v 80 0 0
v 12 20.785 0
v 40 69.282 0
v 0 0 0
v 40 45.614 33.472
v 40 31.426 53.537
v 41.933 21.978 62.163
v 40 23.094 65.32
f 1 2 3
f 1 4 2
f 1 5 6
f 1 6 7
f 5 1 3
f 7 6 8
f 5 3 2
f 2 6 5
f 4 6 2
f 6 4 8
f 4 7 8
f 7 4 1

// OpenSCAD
alpha = acos (1/3);

module tetraeder (len) {
    difference() {
        cube([len, len, len]);
        translate([len,0,0])
            rotate(30,[0,0,1])
                rotate(-(90-alpha),[0,1,0])
                    translate([0,0,-len*0.3])
                        cube([len*1.6, len*1.6, len*1.6]);
        rotate(-30,[0,0,1])
            rotate(90-alpha,[0,1,0])
                translate([-len*1.6,0,-len*0.3])
                    cube([len*1.6, len*1.6, len*1.6]);
        rotate(-(90-alpha),[1,0,0])
            translate([0,-len*1.6,0])
                cube([len*1.6, len*1.6, len*1.6]);
    }
}

tetraeder(80);
